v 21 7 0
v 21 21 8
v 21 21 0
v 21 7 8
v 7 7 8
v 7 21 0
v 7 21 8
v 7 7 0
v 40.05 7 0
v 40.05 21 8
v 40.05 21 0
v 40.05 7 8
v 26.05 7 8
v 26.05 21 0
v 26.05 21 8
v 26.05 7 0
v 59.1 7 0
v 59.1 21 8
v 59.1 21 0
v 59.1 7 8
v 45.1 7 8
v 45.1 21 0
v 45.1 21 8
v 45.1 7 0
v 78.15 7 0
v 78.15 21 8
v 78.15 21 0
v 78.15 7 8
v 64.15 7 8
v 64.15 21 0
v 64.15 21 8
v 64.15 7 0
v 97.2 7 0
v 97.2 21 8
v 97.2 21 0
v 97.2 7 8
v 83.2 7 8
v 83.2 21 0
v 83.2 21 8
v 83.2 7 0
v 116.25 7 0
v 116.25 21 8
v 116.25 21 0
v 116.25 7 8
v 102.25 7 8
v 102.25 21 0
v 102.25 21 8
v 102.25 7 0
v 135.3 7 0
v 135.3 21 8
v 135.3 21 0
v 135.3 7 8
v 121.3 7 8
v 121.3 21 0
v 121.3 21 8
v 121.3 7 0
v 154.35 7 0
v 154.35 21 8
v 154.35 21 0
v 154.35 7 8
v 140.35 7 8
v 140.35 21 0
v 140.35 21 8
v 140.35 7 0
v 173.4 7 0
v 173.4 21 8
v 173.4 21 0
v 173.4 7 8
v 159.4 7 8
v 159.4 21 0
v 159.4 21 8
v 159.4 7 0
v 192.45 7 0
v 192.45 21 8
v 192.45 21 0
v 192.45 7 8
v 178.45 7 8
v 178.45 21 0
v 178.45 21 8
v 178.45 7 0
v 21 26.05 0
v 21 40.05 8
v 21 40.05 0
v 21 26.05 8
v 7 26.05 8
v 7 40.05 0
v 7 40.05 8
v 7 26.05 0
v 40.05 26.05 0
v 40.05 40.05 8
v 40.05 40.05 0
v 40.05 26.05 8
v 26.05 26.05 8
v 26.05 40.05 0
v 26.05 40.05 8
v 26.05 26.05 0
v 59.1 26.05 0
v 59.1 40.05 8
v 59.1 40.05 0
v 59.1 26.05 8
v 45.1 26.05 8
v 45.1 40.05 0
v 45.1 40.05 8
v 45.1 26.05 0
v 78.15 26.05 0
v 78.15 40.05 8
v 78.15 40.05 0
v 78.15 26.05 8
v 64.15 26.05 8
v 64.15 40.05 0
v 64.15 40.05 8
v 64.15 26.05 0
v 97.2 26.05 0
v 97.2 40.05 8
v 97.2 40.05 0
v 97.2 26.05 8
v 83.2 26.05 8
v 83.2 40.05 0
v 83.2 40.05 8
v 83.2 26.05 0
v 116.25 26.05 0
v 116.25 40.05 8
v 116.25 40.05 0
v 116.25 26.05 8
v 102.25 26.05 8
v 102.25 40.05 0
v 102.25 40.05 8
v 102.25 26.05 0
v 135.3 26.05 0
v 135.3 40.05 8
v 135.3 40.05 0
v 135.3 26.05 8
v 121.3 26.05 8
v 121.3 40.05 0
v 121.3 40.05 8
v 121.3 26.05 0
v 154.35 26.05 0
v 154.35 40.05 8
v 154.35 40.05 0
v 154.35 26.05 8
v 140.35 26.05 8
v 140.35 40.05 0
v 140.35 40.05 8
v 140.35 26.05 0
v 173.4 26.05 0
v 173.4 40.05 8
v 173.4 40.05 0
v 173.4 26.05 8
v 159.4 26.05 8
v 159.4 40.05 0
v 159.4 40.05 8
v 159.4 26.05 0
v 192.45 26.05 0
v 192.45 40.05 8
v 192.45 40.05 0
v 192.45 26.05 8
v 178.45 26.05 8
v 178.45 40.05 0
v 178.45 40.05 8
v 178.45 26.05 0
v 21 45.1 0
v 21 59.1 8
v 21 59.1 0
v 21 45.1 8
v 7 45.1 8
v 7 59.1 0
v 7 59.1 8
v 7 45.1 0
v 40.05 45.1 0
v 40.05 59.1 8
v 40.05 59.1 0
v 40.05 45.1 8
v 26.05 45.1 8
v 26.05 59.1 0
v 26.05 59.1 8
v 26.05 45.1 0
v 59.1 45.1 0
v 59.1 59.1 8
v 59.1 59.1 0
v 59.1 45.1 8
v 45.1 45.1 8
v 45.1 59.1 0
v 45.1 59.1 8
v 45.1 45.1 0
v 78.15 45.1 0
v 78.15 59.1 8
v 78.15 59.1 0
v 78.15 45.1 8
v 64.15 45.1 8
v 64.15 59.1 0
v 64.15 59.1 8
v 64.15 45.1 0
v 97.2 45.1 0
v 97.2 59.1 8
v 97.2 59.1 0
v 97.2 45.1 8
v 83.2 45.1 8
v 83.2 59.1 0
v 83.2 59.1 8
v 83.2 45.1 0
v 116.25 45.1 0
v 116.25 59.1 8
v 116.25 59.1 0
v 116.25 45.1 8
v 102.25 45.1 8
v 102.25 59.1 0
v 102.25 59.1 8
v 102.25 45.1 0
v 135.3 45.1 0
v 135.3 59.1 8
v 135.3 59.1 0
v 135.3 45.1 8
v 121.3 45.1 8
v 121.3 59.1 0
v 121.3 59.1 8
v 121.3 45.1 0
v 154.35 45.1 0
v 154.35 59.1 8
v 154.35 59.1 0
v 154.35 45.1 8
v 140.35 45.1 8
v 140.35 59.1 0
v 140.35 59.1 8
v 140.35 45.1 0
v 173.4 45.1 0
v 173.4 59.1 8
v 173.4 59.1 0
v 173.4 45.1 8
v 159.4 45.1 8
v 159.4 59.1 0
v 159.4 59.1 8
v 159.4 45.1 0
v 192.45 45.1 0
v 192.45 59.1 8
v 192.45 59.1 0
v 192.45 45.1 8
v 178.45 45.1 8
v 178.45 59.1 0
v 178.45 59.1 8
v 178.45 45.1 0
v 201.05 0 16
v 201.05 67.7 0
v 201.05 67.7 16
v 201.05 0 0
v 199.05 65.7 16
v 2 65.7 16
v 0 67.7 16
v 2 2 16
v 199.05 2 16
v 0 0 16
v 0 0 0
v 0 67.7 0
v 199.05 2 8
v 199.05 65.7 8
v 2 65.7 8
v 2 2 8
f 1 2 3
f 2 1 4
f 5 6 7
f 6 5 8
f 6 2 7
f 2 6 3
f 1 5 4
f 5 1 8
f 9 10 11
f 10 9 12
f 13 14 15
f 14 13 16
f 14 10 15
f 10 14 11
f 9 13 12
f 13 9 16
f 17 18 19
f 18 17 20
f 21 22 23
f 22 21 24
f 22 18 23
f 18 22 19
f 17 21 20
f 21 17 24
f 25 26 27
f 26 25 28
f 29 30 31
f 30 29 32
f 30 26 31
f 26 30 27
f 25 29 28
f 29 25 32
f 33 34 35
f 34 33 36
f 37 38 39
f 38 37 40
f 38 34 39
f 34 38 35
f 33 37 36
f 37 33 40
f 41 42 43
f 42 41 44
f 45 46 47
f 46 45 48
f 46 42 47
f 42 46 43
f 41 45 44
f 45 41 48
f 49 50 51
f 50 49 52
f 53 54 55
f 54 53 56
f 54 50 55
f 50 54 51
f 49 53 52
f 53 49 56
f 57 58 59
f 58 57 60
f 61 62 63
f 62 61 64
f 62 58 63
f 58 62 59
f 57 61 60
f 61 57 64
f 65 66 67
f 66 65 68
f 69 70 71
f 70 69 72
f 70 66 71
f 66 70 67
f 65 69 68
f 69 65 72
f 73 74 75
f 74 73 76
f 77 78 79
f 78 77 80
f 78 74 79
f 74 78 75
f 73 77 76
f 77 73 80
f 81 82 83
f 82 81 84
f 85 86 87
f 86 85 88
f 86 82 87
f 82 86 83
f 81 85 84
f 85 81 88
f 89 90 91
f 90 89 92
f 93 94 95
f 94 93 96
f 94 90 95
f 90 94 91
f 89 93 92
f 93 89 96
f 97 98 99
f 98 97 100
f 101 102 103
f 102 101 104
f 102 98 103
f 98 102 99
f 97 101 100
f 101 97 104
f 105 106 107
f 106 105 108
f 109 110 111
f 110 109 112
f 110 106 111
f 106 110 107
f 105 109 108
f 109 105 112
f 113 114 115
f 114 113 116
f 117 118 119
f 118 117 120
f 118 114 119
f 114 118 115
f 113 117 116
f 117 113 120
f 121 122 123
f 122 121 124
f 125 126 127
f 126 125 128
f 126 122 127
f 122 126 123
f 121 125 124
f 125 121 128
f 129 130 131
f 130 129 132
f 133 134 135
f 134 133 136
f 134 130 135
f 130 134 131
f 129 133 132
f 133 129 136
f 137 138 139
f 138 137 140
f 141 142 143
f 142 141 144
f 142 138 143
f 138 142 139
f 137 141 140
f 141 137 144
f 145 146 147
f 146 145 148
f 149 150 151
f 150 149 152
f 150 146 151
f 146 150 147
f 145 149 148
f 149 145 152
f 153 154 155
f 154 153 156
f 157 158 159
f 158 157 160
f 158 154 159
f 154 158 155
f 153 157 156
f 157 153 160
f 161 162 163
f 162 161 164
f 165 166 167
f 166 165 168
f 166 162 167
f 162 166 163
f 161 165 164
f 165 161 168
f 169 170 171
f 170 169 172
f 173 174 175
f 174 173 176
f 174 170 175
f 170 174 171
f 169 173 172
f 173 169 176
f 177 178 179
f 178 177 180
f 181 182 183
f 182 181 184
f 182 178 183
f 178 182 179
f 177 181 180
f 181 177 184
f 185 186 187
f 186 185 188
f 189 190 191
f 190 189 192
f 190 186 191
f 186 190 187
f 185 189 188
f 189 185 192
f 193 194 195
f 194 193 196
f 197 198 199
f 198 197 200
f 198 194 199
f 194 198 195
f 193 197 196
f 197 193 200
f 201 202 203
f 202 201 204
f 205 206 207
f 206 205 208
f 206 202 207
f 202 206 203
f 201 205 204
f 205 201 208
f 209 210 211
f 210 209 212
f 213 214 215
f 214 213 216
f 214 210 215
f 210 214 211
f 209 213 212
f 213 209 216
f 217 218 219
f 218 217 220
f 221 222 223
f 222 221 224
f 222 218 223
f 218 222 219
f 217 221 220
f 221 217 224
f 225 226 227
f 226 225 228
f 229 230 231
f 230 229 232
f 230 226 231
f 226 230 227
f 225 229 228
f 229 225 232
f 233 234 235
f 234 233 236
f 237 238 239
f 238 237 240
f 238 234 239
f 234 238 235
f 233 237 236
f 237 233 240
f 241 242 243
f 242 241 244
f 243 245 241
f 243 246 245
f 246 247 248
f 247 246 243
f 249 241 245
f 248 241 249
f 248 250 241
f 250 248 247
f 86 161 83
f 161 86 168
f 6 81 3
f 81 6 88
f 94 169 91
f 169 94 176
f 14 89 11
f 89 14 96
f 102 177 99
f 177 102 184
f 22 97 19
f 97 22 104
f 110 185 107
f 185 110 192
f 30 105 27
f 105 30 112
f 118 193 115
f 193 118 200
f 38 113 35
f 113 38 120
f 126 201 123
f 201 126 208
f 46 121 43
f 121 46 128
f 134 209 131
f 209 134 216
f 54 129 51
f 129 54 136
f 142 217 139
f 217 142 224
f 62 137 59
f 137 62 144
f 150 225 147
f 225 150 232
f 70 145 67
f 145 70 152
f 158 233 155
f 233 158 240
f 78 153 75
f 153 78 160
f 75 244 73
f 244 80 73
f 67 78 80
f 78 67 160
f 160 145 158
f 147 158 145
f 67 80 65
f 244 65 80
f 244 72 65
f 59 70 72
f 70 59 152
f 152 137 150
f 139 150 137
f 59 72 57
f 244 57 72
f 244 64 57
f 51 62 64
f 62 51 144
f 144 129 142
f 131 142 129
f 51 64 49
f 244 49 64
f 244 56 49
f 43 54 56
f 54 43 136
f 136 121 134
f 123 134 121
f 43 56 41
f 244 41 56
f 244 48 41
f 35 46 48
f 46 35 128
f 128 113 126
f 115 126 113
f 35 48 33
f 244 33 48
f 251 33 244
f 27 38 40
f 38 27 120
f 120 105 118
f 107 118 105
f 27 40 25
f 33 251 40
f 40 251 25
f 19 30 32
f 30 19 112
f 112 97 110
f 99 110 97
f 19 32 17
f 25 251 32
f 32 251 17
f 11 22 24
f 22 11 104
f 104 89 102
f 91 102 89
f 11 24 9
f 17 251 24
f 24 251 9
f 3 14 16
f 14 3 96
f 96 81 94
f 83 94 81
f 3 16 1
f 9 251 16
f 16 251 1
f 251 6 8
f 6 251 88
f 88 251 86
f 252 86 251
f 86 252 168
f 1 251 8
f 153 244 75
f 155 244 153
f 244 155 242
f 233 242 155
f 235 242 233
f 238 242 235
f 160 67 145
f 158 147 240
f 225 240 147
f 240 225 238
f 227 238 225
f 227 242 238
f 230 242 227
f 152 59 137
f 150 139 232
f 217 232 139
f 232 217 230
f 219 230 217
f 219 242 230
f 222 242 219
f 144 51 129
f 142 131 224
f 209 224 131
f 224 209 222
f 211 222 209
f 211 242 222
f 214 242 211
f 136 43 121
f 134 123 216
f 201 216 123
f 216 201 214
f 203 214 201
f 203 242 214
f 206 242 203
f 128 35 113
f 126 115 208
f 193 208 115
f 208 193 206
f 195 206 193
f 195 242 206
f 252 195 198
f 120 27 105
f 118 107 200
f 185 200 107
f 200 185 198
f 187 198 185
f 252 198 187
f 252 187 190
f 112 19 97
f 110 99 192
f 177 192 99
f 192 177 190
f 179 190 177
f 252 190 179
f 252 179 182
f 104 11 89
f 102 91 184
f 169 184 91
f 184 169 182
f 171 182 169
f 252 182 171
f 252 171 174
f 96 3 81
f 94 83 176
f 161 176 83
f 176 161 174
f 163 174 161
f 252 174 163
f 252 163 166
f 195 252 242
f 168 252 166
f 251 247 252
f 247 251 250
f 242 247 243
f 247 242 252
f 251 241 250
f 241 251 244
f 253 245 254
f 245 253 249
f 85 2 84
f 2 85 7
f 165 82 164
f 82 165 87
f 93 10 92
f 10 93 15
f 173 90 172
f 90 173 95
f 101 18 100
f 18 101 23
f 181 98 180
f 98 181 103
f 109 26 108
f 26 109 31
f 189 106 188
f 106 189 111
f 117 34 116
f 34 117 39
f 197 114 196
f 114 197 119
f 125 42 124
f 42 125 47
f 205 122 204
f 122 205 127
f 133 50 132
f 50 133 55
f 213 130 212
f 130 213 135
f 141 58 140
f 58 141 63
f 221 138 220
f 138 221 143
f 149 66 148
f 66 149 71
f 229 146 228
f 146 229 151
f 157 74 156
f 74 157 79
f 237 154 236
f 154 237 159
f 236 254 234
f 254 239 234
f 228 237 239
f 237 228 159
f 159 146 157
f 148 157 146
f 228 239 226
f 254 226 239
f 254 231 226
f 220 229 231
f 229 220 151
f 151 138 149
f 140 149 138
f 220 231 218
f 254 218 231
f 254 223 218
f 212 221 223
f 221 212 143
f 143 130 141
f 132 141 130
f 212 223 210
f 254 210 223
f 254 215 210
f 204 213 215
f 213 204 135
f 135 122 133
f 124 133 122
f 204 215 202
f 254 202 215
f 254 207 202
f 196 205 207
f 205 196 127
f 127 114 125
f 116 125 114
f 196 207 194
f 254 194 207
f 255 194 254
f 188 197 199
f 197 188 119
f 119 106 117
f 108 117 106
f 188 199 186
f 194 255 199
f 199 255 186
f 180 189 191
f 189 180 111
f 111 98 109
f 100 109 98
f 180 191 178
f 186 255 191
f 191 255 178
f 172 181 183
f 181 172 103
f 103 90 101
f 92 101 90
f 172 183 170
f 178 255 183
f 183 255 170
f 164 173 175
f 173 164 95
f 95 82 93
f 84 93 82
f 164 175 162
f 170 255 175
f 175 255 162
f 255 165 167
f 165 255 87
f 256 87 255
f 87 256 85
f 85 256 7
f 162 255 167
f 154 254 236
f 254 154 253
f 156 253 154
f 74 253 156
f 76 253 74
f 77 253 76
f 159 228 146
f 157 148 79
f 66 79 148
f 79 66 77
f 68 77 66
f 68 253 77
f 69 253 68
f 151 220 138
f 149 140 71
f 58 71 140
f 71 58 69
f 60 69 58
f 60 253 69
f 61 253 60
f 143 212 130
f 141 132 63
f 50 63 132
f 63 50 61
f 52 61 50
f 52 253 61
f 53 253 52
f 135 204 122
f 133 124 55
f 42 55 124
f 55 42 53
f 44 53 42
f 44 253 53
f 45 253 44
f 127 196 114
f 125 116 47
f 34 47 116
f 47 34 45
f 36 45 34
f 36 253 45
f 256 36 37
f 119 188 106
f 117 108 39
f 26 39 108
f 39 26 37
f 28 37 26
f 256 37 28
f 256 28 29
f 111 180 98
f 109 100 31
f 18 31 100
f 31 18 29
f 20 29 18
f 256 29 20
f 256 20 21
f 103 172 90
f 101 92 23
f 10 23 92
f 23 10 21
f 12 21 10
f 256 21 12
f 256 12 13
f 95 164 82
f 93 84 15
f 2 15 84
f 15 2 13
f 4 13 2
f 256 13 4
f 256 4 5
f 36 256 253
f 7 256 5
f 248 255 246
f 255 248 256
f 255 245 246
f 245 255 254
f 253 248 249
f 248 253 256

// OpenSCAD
// Generated keyboard case
// Layout: 3x10
// Switch type: Cherry MX

// Parameters
case_width = 201.05;
case_height = 67.70;
case_depth = 16.00;
wall_thickness = 2.00;
base_height = 8.00;
switch_cutout_size = 14.00;
key_spacing = 19.05;

module keyboard_case() {
    difference() {
        // Outer shell
        translate([0, 0, 0])
            cube([case_width, case_height, case_depth]);

        // Inner cavity
        translate([wall_thickness, wall_thickness, base_height])
            cube([case_width - 2*wall_thickness, 
                  case_height - 2*wall_thickness, 
                  case_depth - base_height + 1]);

        // Switch cutouts
        translate([wall_thickness + 5 - 0.00, wall_thickness + 5 - 0.00, -1])
            switch_plate();
    }
}

module switch_plate() {
    translate([0.00, 0.00, 0])
        cube([switch_cutout_size, switch_cutout_size, base_height + 2]);
    translate([19.05, 0.00, 0])
        cube([switch_cutout_size, switch_cutout_size, base_height + 2]);
    translate([38.10, 0.00, 0])
        cube([switch_cutout_size, switch_cutout_size, base_height + 2]);
    translate([57.15, 0.00, 0])
        cube([switch_cutout_size, switch_cutout_size, base_height + 2]);
    translate([76.20, 0.00, 0])
        cube([switch_cutout_size, switch_cutout_size, base_height + 2]);
    translate([95.25, 0.00, 0])
        cube([switch_cutout_size, switch_cutout_size, base_height + 2]);
    translate([114.30, 0.00, 0])
        cube([switch_cutout_size, switch_cutout_size, base_height + 2]);
    translate([133.35, 0.00, 0])
        cube([switch_cutout_size, switch_cutout_size, base_height + 2]);
    translate([152.40, 0.00, 0])
        cube([switch_cutout_size, switch_cutout_size, base_height + 2]);
    translate([171.45, 0.00, 0])
        cube([switch_cutout_size, switch_cutout_size, base_height + 2]);
    translate([0.00, 19.05, 0])
        cube([switch_cutout_size, switch_cutout_size, base_height + 2]);
    translate([19.05, 19.05, 0])
        cube([switch_cutout_size, switch_cutout_size, base_height + 2]);
    translate([38.10, 19.05, 0])
        cube([switch_cutout_size, switch_cutout_size, base_height + 2]);
    translate([57.15, 19.05, 0])
        cube([switch_cutout_size, switch_cutout_size, base_height + 2]);
    translate([76.20, 19.05, 0])
        cube([switch_cutout_size, switch_cutout_size, base_height + 2]);
    translate([95.25, 19.05, 0])
        cube([switch_cutout_size, switch_cutout_size, base_height + 2]);
    translate([114.30, 19.05, 0])
        cube([switch_cutout_size, switch_cutout_size, base_height + 2]);
    translate([133.35, 19.05, 0])
        cube([switch_cutout_size, switch_cutout_size, base_height + 2]);
    translate([152.40, 19.05, 0])
        cube([switch_cutout_size, switch_cutout_size, base_height + 2]);
    translate([171.45, 19.05, 0])
        cube([switch_cutout_size, switch_cutout_size, base_height + 2]);
    translate([0.00, 38.10, 0])
        cube([switch_cutout_size, switch_cutout_size, base_height + 2]);
    translate([19.05, 38.10, 0])
        cube([switch_cutout_size, switch_cutout_size, base_height + 2]);
    translate([38.10, 38.10, 0])
        cube([switch_cutout_size, switch_cutout_size, base_height + 2]);
    translate([57.15, 38.10, 0])
        cube([switch_cutout_size, switch_cutout_size, base_height + 2]);
    translate([76.20, 38.10, 0])
        cube([switch_cutout_size, switch_cutout_size, base_height + 2]);
    translate([95.25, 38.10, 0])
        cube([switch_cutout_size, switch_cutout_size, base_height + 2]);
    translate([114.30, 38.10, 0])
        cube([switch_cutout_size, switch_cutout_size, base_height + 2]);
    translate([133.35, 38.10, 0])
        cube([switch_cutout_size, switch_cutout_size, base_height + 2]);
    translate([152.40, 38.10, 0])
        cube([switch_cutout_size, switch_cutout_size, base_height + 2]);
    translate([171.45, 38.10, 0])
        cube([switch_cutout_size, switch_cutout_size, base_height + 2]);
}

// Generate the case
keyboard_case();
